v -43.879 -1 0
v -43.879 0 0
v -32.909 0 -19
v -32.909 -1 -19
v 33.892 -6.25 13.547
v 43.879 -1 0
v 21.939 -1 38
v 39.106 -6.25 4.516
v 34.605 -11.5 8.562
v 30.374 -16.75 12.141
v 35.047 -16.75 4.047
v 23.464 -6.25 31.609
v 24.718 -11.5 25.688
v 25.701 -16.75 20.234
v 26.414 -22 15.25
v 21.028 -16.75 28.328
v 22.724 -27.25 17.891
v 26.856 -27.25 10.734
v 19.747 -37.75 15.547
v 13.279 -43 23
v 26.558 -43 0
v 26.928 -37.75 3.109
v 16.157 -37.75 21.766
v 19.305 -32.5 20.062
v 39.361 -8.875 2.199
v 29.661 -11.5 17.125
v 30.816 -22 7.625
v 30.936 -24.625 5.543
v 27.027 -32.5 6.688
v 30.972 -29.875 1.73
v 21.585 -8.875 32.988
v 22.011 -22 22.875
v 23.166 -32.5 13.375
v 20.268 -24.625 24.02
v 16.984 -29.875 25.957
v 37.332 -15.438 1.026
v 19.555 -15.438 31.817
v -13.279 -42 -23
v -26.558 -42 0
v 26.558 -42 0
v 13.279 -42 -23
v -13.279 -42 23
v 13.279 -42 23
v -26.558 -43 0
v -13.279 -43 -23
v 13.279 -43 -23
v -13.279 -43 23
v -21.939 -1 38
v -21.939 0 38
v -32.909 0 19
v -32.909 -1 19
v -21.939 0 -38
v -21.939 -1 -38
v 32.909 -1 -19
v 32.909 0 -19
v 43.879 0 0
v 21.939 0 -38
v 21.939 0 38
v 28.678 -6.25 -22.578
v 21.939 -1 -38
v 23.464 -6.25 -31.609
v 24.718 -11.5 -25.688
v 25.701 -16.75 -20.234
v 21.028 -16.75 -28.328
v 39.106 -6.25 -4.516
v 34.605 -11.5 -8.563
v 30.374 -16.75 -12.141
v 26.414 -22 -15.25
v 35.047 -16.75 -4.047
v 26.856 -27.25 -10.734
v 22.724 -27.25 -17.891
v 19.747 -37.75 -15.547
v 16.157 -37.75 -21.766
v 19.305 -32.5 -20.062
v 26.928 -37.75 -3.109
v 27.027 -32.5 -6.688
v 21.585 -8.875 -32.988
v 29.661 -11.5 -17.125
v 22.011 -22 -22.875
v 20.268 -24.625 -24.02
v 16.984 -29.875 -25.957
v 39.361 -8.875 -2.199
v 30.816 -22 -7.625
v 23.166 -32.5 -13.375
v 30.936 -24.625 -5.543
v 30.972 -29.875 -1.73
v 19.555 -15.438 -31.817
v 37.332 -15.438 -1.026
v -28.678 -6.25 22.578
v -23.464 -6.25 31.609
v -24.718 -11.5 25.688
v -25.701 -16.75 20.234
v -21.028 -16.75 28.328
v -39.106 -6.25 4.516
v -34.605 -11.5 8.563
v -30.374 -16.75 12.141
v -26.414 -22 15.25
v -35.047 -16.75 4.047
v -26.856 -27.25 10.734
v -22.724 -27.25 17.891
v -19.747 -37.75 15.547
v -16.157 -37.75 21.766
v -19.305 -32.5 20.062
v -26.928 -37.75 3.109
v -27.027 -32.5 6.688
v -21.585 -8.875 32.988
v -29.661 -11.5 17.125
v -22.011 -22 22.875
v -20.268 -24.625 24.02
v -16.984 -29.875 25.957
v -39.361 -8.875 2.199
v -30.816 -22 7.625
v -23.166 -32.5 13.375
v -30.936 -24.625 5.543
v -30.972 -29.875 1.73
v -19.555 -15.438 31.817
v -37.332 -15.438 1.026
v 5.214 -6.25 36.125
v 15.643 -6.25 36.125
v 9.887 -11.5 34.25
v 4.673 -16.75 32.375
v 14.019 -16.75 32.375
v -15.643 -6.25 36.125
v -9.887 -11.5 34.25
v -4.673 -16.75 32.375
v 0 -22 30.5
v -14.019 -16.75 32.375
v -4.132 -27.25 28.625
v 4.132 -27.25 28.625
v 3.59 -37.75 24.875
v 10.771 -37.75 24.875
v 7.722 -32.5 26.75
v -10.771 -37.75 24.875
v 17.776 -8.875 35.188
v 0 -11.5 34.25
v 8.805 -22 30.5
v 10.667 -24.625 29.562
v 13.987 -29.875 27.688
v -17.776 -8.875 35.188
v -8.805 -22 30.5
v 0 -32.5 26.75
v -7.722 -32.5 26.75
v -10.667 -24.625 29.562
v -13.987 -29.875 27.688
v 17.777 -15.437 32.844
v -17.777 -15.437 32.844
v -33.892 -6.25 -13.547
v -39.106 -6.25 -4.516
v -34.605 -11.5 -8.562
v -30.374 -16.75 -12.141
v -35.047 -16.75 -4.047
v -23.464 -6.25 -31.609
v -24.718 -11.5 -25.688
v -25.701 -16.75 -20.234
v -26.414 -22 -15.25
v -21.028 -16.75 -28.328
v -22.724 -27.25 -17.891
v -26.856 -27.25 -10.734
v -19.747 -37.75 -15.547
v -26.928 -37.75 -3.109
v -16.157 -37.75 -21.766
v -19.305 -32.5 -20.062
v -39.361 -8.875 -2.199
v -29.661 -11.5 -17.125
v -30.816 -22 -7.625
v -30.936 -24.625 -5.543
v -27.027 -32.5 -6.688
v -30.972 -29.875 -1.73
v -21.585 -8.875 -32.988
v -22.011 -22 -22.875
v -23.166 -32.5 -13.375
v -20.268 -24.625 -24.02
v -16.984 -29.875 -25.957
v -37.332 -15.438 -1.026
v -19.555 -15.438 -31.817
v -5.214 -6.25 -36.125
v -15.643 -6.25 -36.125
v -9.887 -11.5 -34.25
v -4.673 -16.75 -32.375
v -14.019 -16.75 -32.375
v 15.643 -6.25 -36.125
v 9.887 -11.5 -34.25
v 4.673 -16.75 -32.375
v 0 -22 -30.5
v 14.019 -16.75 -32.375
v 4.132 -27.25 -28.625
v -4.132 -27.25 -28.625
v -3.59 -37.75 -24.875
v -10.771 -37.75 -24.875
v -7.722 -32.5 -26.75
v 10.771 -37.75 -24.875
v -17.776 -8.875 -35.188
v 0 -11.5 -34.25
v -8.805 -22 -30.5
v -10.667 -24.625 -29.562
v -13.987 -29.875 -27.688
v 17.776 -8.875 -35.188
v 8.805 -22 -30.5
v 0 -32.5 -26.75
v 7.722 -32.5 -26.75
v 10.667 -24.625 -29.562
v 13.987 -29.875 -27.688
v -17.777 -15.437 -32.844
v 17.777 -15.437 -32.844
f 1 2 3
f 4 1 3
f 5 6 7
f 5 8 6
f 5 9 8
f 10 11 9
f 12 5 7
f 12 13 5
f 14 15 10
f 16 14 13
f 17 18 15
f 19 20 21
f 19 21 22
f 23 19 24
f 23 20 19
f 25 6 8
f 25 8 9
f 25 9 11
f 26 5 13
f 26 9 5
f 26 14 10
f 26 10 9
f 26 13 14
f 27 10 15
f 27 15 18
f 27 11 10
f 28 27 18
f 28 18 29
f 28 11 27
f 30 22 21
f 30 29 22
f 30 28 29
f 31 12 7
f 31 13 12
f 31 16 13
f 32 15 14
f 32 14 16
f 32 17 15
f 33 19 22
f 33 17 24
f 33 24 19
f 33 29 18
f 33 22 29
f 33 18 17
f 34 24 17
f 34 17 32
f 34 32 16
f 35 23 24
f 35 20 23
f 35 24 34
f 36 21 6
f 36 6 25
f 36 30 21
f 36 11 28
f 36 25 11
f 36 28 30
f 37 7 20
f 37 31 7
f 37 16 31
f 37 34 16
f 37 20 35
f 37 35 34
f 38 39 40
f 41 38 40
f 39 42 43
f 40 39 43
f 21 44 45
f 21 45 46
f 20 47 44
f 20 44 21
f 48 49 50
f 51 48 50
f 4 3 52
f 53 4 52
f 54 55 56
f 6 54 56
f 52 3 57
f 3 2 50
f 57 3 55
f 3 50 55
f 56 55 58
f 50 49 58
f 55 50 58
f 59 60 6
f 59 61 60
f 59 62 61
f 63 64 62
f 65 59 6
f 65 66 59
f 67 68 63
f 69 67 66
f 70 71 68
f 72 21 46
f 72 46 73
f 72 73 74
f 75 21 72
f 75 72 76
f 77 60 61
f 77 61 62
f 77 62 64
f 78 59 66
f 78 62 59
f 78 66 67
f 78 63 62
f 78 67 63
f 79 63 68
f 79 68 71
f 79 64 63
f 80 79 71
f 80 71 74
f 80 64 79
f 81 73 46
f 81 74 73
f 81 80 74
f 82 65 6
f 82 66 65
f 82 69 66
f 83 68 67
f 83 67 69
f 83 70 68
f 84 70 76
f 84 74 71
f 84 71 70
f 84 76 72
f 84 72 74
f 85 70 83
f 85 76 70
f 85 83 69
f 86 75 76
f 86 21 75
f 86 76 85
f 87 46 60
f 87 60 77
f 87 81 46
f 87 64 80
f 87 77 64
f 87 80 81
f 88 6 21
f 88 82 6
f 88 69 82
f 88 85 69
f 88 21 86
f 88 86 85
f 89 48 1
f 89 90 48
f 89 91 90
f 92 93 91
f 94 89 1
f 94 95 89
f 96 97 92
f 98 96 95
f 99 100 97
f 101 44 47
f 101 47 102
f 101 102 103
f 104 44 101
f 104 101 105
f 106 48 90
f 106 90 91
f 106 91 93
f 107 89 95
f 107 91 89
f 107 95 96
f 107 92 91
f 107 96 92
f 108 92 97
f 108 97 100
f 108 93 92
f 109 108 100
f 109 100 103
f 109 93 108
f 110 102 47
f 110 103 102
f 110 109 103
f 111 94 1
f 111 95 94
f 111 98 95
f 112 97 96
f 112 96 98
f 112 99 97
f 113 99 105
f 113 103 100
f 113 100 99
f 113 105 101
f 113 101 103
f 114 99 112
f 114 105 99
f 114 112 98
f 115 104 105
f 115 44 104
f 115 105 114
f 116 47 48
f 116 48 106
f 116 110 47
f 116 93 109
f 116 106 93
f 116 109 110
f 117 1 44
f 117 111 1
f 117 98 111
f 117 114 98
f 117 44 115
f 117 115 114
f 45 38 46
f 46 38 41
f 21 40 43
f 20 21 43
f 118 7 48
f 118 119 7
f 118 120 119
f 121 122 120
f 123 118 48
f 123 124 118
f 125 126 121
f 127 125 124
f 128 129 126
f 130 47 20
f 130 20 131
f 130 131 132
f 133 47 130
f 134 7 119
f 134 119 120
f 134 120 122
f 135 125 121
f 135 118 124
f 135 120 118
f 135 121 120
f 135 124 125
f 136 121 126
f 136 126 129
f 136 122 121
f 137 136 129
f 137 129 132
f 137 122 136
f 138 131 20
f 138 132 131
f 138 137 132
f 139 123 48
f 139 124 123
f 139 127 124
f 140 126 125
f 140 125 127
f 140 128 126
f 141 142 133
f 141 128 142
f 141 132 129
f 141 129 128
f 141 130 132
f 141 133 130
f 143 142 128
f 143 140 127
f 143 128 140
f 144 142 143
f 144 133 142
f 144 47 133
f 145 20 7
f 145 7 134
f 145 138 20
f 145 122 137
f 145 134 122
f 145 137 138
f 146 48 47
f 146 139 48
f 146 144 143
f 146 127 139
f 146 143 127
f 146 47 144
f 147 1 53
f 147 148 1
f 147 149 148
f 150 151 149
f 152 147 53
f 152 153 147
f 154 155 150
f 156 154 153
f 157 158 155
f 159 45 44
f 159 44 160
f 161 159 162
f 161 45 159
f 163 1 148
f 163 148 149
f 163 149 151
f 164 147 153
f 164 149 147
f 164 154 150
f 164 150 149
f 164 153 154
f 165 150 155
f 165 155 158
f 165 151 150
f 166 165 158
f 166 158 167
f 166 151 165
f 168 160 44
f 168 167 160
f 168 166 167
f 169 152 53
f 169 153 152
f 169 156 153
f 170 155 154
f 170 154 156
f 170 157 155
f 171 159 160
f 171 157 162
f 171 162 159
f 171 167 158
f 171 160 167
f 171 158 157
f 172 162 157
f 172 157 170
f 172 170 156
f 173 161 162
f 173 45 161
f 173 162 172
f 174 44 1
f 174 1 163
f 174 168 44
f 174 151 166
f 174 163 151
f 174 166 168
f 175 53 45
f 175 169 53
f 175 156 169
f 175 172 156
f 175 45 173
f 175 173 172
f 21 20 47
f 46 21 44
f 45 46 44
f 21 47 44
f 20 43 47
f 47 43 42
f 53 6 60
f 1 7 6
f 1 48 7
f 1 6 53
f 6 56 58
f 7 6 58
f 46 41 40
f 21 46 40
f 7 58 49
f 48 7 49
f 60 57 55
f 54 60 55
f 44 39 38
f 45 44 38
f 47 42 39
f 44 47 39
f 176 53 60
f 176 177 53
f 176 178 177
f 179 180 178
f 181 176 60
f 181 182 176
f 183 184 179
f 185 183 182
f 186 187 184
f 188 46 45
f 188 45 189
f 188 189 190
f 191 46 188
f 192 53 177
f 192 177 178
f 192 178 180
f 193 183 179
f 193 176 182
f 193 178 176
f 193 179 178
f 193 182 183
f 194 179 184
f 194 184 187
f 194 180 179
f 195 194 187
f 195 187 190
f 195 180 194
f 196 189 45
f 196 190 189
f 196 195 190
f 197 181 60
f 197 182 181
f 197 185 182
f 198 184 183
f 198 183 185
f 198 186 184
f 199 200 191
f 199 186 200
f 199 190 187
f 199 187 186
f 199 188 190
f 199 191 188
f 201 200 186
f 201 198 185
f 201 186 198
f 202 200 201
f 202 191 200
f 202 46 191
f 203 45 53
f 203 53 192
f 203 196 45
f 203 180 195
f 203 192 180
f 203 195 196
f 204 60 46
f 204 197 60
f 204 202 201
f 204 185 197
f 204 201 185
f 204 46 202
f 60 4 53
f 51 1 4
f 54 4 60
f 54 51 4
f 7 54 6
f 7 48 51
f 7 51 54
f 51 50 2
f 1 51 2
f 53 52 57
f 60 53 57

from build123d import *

# Parameters (mm, degrees)
F1_DEPTH = 1
F4_DEPTH = 1


with BuildPart() as f1:
    # F0 (on Front) → F1 (new body)
    with BuildSketch(Plane.XZ):
        with BuildLine():
            ThreePointArc((32.9089649593, -19.0000006659), (36.7051812995, -9.8351240853), (38, 0))
            ThreePointArc((38, 0), (36.7051814771, 9.8351234225), (32.9089656454, 18.9999994776))
            ThreePointArc((32.9089656454, 18.9999994776), (19.0000002592, 32.9089651942), (-4.7e-09, 38))
            ThreePointArc((-4.7e-09, 38), (-19.0000001839, 32.9089652376), (-32.9089655538, 18.9999996362))
            ThreePointArc((-32.9089655538, 18.9999996362), (-38, -7.627e-07), (-32.9089647912, -19.0000009572))
            ThreePointArc((-32.9089647912, -19.0000009572), (-18.9999995214, -32.9089656201), (0, -38))
            ThreePointArc((0, -38), (18.999999667, -32.908965536), (32.9089649593, -19.0000006659))
        make_face()
        with BuildLine():
            ThreePointArc((32.9089656454, 18.9999994776), (36.7051814771, 9.8351234225), (38, 0))
            ThreePointArc((38, 0), (36.7051812995, -9.8351240853), (32.9089649593, -19.0000006659))
            Line((32.9089649593, -19.0000006659), (43.8786204584, 0))
            Line((43.8786204584, 0), (32.9089656454, 18.9999994776))
        make_face()
        with BuildLine():
            ThreePointArc((-4.7e-09, 38), (19.0000002592, 32.9089651942), (32.9089656454, 18.9999994776))
            Line((32.9089656454, 18.9999994776), (21.9393102292, 38))
            Line((21.9393102292, 38), (-4.7e-09, 38))
        make_face()
        with BuildLine():
            Line((21.9393102292, -38), (32.9089649593, -19.0000006659))
            ThreePointArc((32.9089649593, -19.0000006659), (18.999999667, -32.908965536), (0, -38))
            Line((0, -38), (21.9393102292, -38))
        make_face()
        with BuildLine():
            ThreePointArc((-32.9089655538, 18.9999996362), (-19.0000001839, 32.9089652376), (-4.7e-09, 38))
            Line((-4.7e-09, 38), (-21.9393102292, 38))
            Line((-21.9393102292, 38), (-32.9089655538, 18.9999996362))
        make_face()
        with BuildLine():
            Line((-21.9393102292, -38), (0, -38))
            ThreePointArc((0, -38), (-18.9999995214, -32.9089656201), (-32.9089647912, -19.0000009572))
            Line((-32.9089647912, -19.0000009572), (-21.9393102292, -38))
        make_face()
        with BuildLine():
            ThreePointArc((-32.9089647912, -19.0000009572), (-38, -7.627e-07), (-32.9089655538, 18.9999996362))
            Line((-32.9089655538, 18.9999996362), (-43.8786204584, 0))
            Line((-43.8786204584, 0), (-32.9089647912, -19.0000009572))
        make_face()
    extrude(amount=F1_DEPTH)


with BuildPart() as f4:
    # F3 (on offset) → F4 (new body)
    with BuildSketch(Plane.XZ.offset(42)):
        Polygon((13.2790561914, 23), (-13.2790561914, 23), (-26.5581123827, 0), (-13.2790561914, -23), (13.2790561914, -23), (26.5581123827, 0), align=None)
    extrude(amount=F4_DEPTH)


with BuildPart() as f7:
    # F5 (on face) → F7 section 0
    with BuildSketch(Plane.XZ.offset(1)):
        Polygon((21.9393102292, 38), (-21.9393102292, 38), (-43.8786204584, 0), (-21.9393102292, -38), (21.9393102292, -38), (43.8786204584, 0), align=None)
    # F6 (on face) → F7 section 1
    with BuildSketch(Plane.XZ.offset(43)):
        Polygon((13.2790561914, 23), (-13.2790561914, 23), (-26.5581123827, 0), (-13.2790561914, -23), (13.2790561914, -23), (26.5581123827, 0), align=None)
    loft()


solid = Compound([f1.part, f4.part, f7.part])
